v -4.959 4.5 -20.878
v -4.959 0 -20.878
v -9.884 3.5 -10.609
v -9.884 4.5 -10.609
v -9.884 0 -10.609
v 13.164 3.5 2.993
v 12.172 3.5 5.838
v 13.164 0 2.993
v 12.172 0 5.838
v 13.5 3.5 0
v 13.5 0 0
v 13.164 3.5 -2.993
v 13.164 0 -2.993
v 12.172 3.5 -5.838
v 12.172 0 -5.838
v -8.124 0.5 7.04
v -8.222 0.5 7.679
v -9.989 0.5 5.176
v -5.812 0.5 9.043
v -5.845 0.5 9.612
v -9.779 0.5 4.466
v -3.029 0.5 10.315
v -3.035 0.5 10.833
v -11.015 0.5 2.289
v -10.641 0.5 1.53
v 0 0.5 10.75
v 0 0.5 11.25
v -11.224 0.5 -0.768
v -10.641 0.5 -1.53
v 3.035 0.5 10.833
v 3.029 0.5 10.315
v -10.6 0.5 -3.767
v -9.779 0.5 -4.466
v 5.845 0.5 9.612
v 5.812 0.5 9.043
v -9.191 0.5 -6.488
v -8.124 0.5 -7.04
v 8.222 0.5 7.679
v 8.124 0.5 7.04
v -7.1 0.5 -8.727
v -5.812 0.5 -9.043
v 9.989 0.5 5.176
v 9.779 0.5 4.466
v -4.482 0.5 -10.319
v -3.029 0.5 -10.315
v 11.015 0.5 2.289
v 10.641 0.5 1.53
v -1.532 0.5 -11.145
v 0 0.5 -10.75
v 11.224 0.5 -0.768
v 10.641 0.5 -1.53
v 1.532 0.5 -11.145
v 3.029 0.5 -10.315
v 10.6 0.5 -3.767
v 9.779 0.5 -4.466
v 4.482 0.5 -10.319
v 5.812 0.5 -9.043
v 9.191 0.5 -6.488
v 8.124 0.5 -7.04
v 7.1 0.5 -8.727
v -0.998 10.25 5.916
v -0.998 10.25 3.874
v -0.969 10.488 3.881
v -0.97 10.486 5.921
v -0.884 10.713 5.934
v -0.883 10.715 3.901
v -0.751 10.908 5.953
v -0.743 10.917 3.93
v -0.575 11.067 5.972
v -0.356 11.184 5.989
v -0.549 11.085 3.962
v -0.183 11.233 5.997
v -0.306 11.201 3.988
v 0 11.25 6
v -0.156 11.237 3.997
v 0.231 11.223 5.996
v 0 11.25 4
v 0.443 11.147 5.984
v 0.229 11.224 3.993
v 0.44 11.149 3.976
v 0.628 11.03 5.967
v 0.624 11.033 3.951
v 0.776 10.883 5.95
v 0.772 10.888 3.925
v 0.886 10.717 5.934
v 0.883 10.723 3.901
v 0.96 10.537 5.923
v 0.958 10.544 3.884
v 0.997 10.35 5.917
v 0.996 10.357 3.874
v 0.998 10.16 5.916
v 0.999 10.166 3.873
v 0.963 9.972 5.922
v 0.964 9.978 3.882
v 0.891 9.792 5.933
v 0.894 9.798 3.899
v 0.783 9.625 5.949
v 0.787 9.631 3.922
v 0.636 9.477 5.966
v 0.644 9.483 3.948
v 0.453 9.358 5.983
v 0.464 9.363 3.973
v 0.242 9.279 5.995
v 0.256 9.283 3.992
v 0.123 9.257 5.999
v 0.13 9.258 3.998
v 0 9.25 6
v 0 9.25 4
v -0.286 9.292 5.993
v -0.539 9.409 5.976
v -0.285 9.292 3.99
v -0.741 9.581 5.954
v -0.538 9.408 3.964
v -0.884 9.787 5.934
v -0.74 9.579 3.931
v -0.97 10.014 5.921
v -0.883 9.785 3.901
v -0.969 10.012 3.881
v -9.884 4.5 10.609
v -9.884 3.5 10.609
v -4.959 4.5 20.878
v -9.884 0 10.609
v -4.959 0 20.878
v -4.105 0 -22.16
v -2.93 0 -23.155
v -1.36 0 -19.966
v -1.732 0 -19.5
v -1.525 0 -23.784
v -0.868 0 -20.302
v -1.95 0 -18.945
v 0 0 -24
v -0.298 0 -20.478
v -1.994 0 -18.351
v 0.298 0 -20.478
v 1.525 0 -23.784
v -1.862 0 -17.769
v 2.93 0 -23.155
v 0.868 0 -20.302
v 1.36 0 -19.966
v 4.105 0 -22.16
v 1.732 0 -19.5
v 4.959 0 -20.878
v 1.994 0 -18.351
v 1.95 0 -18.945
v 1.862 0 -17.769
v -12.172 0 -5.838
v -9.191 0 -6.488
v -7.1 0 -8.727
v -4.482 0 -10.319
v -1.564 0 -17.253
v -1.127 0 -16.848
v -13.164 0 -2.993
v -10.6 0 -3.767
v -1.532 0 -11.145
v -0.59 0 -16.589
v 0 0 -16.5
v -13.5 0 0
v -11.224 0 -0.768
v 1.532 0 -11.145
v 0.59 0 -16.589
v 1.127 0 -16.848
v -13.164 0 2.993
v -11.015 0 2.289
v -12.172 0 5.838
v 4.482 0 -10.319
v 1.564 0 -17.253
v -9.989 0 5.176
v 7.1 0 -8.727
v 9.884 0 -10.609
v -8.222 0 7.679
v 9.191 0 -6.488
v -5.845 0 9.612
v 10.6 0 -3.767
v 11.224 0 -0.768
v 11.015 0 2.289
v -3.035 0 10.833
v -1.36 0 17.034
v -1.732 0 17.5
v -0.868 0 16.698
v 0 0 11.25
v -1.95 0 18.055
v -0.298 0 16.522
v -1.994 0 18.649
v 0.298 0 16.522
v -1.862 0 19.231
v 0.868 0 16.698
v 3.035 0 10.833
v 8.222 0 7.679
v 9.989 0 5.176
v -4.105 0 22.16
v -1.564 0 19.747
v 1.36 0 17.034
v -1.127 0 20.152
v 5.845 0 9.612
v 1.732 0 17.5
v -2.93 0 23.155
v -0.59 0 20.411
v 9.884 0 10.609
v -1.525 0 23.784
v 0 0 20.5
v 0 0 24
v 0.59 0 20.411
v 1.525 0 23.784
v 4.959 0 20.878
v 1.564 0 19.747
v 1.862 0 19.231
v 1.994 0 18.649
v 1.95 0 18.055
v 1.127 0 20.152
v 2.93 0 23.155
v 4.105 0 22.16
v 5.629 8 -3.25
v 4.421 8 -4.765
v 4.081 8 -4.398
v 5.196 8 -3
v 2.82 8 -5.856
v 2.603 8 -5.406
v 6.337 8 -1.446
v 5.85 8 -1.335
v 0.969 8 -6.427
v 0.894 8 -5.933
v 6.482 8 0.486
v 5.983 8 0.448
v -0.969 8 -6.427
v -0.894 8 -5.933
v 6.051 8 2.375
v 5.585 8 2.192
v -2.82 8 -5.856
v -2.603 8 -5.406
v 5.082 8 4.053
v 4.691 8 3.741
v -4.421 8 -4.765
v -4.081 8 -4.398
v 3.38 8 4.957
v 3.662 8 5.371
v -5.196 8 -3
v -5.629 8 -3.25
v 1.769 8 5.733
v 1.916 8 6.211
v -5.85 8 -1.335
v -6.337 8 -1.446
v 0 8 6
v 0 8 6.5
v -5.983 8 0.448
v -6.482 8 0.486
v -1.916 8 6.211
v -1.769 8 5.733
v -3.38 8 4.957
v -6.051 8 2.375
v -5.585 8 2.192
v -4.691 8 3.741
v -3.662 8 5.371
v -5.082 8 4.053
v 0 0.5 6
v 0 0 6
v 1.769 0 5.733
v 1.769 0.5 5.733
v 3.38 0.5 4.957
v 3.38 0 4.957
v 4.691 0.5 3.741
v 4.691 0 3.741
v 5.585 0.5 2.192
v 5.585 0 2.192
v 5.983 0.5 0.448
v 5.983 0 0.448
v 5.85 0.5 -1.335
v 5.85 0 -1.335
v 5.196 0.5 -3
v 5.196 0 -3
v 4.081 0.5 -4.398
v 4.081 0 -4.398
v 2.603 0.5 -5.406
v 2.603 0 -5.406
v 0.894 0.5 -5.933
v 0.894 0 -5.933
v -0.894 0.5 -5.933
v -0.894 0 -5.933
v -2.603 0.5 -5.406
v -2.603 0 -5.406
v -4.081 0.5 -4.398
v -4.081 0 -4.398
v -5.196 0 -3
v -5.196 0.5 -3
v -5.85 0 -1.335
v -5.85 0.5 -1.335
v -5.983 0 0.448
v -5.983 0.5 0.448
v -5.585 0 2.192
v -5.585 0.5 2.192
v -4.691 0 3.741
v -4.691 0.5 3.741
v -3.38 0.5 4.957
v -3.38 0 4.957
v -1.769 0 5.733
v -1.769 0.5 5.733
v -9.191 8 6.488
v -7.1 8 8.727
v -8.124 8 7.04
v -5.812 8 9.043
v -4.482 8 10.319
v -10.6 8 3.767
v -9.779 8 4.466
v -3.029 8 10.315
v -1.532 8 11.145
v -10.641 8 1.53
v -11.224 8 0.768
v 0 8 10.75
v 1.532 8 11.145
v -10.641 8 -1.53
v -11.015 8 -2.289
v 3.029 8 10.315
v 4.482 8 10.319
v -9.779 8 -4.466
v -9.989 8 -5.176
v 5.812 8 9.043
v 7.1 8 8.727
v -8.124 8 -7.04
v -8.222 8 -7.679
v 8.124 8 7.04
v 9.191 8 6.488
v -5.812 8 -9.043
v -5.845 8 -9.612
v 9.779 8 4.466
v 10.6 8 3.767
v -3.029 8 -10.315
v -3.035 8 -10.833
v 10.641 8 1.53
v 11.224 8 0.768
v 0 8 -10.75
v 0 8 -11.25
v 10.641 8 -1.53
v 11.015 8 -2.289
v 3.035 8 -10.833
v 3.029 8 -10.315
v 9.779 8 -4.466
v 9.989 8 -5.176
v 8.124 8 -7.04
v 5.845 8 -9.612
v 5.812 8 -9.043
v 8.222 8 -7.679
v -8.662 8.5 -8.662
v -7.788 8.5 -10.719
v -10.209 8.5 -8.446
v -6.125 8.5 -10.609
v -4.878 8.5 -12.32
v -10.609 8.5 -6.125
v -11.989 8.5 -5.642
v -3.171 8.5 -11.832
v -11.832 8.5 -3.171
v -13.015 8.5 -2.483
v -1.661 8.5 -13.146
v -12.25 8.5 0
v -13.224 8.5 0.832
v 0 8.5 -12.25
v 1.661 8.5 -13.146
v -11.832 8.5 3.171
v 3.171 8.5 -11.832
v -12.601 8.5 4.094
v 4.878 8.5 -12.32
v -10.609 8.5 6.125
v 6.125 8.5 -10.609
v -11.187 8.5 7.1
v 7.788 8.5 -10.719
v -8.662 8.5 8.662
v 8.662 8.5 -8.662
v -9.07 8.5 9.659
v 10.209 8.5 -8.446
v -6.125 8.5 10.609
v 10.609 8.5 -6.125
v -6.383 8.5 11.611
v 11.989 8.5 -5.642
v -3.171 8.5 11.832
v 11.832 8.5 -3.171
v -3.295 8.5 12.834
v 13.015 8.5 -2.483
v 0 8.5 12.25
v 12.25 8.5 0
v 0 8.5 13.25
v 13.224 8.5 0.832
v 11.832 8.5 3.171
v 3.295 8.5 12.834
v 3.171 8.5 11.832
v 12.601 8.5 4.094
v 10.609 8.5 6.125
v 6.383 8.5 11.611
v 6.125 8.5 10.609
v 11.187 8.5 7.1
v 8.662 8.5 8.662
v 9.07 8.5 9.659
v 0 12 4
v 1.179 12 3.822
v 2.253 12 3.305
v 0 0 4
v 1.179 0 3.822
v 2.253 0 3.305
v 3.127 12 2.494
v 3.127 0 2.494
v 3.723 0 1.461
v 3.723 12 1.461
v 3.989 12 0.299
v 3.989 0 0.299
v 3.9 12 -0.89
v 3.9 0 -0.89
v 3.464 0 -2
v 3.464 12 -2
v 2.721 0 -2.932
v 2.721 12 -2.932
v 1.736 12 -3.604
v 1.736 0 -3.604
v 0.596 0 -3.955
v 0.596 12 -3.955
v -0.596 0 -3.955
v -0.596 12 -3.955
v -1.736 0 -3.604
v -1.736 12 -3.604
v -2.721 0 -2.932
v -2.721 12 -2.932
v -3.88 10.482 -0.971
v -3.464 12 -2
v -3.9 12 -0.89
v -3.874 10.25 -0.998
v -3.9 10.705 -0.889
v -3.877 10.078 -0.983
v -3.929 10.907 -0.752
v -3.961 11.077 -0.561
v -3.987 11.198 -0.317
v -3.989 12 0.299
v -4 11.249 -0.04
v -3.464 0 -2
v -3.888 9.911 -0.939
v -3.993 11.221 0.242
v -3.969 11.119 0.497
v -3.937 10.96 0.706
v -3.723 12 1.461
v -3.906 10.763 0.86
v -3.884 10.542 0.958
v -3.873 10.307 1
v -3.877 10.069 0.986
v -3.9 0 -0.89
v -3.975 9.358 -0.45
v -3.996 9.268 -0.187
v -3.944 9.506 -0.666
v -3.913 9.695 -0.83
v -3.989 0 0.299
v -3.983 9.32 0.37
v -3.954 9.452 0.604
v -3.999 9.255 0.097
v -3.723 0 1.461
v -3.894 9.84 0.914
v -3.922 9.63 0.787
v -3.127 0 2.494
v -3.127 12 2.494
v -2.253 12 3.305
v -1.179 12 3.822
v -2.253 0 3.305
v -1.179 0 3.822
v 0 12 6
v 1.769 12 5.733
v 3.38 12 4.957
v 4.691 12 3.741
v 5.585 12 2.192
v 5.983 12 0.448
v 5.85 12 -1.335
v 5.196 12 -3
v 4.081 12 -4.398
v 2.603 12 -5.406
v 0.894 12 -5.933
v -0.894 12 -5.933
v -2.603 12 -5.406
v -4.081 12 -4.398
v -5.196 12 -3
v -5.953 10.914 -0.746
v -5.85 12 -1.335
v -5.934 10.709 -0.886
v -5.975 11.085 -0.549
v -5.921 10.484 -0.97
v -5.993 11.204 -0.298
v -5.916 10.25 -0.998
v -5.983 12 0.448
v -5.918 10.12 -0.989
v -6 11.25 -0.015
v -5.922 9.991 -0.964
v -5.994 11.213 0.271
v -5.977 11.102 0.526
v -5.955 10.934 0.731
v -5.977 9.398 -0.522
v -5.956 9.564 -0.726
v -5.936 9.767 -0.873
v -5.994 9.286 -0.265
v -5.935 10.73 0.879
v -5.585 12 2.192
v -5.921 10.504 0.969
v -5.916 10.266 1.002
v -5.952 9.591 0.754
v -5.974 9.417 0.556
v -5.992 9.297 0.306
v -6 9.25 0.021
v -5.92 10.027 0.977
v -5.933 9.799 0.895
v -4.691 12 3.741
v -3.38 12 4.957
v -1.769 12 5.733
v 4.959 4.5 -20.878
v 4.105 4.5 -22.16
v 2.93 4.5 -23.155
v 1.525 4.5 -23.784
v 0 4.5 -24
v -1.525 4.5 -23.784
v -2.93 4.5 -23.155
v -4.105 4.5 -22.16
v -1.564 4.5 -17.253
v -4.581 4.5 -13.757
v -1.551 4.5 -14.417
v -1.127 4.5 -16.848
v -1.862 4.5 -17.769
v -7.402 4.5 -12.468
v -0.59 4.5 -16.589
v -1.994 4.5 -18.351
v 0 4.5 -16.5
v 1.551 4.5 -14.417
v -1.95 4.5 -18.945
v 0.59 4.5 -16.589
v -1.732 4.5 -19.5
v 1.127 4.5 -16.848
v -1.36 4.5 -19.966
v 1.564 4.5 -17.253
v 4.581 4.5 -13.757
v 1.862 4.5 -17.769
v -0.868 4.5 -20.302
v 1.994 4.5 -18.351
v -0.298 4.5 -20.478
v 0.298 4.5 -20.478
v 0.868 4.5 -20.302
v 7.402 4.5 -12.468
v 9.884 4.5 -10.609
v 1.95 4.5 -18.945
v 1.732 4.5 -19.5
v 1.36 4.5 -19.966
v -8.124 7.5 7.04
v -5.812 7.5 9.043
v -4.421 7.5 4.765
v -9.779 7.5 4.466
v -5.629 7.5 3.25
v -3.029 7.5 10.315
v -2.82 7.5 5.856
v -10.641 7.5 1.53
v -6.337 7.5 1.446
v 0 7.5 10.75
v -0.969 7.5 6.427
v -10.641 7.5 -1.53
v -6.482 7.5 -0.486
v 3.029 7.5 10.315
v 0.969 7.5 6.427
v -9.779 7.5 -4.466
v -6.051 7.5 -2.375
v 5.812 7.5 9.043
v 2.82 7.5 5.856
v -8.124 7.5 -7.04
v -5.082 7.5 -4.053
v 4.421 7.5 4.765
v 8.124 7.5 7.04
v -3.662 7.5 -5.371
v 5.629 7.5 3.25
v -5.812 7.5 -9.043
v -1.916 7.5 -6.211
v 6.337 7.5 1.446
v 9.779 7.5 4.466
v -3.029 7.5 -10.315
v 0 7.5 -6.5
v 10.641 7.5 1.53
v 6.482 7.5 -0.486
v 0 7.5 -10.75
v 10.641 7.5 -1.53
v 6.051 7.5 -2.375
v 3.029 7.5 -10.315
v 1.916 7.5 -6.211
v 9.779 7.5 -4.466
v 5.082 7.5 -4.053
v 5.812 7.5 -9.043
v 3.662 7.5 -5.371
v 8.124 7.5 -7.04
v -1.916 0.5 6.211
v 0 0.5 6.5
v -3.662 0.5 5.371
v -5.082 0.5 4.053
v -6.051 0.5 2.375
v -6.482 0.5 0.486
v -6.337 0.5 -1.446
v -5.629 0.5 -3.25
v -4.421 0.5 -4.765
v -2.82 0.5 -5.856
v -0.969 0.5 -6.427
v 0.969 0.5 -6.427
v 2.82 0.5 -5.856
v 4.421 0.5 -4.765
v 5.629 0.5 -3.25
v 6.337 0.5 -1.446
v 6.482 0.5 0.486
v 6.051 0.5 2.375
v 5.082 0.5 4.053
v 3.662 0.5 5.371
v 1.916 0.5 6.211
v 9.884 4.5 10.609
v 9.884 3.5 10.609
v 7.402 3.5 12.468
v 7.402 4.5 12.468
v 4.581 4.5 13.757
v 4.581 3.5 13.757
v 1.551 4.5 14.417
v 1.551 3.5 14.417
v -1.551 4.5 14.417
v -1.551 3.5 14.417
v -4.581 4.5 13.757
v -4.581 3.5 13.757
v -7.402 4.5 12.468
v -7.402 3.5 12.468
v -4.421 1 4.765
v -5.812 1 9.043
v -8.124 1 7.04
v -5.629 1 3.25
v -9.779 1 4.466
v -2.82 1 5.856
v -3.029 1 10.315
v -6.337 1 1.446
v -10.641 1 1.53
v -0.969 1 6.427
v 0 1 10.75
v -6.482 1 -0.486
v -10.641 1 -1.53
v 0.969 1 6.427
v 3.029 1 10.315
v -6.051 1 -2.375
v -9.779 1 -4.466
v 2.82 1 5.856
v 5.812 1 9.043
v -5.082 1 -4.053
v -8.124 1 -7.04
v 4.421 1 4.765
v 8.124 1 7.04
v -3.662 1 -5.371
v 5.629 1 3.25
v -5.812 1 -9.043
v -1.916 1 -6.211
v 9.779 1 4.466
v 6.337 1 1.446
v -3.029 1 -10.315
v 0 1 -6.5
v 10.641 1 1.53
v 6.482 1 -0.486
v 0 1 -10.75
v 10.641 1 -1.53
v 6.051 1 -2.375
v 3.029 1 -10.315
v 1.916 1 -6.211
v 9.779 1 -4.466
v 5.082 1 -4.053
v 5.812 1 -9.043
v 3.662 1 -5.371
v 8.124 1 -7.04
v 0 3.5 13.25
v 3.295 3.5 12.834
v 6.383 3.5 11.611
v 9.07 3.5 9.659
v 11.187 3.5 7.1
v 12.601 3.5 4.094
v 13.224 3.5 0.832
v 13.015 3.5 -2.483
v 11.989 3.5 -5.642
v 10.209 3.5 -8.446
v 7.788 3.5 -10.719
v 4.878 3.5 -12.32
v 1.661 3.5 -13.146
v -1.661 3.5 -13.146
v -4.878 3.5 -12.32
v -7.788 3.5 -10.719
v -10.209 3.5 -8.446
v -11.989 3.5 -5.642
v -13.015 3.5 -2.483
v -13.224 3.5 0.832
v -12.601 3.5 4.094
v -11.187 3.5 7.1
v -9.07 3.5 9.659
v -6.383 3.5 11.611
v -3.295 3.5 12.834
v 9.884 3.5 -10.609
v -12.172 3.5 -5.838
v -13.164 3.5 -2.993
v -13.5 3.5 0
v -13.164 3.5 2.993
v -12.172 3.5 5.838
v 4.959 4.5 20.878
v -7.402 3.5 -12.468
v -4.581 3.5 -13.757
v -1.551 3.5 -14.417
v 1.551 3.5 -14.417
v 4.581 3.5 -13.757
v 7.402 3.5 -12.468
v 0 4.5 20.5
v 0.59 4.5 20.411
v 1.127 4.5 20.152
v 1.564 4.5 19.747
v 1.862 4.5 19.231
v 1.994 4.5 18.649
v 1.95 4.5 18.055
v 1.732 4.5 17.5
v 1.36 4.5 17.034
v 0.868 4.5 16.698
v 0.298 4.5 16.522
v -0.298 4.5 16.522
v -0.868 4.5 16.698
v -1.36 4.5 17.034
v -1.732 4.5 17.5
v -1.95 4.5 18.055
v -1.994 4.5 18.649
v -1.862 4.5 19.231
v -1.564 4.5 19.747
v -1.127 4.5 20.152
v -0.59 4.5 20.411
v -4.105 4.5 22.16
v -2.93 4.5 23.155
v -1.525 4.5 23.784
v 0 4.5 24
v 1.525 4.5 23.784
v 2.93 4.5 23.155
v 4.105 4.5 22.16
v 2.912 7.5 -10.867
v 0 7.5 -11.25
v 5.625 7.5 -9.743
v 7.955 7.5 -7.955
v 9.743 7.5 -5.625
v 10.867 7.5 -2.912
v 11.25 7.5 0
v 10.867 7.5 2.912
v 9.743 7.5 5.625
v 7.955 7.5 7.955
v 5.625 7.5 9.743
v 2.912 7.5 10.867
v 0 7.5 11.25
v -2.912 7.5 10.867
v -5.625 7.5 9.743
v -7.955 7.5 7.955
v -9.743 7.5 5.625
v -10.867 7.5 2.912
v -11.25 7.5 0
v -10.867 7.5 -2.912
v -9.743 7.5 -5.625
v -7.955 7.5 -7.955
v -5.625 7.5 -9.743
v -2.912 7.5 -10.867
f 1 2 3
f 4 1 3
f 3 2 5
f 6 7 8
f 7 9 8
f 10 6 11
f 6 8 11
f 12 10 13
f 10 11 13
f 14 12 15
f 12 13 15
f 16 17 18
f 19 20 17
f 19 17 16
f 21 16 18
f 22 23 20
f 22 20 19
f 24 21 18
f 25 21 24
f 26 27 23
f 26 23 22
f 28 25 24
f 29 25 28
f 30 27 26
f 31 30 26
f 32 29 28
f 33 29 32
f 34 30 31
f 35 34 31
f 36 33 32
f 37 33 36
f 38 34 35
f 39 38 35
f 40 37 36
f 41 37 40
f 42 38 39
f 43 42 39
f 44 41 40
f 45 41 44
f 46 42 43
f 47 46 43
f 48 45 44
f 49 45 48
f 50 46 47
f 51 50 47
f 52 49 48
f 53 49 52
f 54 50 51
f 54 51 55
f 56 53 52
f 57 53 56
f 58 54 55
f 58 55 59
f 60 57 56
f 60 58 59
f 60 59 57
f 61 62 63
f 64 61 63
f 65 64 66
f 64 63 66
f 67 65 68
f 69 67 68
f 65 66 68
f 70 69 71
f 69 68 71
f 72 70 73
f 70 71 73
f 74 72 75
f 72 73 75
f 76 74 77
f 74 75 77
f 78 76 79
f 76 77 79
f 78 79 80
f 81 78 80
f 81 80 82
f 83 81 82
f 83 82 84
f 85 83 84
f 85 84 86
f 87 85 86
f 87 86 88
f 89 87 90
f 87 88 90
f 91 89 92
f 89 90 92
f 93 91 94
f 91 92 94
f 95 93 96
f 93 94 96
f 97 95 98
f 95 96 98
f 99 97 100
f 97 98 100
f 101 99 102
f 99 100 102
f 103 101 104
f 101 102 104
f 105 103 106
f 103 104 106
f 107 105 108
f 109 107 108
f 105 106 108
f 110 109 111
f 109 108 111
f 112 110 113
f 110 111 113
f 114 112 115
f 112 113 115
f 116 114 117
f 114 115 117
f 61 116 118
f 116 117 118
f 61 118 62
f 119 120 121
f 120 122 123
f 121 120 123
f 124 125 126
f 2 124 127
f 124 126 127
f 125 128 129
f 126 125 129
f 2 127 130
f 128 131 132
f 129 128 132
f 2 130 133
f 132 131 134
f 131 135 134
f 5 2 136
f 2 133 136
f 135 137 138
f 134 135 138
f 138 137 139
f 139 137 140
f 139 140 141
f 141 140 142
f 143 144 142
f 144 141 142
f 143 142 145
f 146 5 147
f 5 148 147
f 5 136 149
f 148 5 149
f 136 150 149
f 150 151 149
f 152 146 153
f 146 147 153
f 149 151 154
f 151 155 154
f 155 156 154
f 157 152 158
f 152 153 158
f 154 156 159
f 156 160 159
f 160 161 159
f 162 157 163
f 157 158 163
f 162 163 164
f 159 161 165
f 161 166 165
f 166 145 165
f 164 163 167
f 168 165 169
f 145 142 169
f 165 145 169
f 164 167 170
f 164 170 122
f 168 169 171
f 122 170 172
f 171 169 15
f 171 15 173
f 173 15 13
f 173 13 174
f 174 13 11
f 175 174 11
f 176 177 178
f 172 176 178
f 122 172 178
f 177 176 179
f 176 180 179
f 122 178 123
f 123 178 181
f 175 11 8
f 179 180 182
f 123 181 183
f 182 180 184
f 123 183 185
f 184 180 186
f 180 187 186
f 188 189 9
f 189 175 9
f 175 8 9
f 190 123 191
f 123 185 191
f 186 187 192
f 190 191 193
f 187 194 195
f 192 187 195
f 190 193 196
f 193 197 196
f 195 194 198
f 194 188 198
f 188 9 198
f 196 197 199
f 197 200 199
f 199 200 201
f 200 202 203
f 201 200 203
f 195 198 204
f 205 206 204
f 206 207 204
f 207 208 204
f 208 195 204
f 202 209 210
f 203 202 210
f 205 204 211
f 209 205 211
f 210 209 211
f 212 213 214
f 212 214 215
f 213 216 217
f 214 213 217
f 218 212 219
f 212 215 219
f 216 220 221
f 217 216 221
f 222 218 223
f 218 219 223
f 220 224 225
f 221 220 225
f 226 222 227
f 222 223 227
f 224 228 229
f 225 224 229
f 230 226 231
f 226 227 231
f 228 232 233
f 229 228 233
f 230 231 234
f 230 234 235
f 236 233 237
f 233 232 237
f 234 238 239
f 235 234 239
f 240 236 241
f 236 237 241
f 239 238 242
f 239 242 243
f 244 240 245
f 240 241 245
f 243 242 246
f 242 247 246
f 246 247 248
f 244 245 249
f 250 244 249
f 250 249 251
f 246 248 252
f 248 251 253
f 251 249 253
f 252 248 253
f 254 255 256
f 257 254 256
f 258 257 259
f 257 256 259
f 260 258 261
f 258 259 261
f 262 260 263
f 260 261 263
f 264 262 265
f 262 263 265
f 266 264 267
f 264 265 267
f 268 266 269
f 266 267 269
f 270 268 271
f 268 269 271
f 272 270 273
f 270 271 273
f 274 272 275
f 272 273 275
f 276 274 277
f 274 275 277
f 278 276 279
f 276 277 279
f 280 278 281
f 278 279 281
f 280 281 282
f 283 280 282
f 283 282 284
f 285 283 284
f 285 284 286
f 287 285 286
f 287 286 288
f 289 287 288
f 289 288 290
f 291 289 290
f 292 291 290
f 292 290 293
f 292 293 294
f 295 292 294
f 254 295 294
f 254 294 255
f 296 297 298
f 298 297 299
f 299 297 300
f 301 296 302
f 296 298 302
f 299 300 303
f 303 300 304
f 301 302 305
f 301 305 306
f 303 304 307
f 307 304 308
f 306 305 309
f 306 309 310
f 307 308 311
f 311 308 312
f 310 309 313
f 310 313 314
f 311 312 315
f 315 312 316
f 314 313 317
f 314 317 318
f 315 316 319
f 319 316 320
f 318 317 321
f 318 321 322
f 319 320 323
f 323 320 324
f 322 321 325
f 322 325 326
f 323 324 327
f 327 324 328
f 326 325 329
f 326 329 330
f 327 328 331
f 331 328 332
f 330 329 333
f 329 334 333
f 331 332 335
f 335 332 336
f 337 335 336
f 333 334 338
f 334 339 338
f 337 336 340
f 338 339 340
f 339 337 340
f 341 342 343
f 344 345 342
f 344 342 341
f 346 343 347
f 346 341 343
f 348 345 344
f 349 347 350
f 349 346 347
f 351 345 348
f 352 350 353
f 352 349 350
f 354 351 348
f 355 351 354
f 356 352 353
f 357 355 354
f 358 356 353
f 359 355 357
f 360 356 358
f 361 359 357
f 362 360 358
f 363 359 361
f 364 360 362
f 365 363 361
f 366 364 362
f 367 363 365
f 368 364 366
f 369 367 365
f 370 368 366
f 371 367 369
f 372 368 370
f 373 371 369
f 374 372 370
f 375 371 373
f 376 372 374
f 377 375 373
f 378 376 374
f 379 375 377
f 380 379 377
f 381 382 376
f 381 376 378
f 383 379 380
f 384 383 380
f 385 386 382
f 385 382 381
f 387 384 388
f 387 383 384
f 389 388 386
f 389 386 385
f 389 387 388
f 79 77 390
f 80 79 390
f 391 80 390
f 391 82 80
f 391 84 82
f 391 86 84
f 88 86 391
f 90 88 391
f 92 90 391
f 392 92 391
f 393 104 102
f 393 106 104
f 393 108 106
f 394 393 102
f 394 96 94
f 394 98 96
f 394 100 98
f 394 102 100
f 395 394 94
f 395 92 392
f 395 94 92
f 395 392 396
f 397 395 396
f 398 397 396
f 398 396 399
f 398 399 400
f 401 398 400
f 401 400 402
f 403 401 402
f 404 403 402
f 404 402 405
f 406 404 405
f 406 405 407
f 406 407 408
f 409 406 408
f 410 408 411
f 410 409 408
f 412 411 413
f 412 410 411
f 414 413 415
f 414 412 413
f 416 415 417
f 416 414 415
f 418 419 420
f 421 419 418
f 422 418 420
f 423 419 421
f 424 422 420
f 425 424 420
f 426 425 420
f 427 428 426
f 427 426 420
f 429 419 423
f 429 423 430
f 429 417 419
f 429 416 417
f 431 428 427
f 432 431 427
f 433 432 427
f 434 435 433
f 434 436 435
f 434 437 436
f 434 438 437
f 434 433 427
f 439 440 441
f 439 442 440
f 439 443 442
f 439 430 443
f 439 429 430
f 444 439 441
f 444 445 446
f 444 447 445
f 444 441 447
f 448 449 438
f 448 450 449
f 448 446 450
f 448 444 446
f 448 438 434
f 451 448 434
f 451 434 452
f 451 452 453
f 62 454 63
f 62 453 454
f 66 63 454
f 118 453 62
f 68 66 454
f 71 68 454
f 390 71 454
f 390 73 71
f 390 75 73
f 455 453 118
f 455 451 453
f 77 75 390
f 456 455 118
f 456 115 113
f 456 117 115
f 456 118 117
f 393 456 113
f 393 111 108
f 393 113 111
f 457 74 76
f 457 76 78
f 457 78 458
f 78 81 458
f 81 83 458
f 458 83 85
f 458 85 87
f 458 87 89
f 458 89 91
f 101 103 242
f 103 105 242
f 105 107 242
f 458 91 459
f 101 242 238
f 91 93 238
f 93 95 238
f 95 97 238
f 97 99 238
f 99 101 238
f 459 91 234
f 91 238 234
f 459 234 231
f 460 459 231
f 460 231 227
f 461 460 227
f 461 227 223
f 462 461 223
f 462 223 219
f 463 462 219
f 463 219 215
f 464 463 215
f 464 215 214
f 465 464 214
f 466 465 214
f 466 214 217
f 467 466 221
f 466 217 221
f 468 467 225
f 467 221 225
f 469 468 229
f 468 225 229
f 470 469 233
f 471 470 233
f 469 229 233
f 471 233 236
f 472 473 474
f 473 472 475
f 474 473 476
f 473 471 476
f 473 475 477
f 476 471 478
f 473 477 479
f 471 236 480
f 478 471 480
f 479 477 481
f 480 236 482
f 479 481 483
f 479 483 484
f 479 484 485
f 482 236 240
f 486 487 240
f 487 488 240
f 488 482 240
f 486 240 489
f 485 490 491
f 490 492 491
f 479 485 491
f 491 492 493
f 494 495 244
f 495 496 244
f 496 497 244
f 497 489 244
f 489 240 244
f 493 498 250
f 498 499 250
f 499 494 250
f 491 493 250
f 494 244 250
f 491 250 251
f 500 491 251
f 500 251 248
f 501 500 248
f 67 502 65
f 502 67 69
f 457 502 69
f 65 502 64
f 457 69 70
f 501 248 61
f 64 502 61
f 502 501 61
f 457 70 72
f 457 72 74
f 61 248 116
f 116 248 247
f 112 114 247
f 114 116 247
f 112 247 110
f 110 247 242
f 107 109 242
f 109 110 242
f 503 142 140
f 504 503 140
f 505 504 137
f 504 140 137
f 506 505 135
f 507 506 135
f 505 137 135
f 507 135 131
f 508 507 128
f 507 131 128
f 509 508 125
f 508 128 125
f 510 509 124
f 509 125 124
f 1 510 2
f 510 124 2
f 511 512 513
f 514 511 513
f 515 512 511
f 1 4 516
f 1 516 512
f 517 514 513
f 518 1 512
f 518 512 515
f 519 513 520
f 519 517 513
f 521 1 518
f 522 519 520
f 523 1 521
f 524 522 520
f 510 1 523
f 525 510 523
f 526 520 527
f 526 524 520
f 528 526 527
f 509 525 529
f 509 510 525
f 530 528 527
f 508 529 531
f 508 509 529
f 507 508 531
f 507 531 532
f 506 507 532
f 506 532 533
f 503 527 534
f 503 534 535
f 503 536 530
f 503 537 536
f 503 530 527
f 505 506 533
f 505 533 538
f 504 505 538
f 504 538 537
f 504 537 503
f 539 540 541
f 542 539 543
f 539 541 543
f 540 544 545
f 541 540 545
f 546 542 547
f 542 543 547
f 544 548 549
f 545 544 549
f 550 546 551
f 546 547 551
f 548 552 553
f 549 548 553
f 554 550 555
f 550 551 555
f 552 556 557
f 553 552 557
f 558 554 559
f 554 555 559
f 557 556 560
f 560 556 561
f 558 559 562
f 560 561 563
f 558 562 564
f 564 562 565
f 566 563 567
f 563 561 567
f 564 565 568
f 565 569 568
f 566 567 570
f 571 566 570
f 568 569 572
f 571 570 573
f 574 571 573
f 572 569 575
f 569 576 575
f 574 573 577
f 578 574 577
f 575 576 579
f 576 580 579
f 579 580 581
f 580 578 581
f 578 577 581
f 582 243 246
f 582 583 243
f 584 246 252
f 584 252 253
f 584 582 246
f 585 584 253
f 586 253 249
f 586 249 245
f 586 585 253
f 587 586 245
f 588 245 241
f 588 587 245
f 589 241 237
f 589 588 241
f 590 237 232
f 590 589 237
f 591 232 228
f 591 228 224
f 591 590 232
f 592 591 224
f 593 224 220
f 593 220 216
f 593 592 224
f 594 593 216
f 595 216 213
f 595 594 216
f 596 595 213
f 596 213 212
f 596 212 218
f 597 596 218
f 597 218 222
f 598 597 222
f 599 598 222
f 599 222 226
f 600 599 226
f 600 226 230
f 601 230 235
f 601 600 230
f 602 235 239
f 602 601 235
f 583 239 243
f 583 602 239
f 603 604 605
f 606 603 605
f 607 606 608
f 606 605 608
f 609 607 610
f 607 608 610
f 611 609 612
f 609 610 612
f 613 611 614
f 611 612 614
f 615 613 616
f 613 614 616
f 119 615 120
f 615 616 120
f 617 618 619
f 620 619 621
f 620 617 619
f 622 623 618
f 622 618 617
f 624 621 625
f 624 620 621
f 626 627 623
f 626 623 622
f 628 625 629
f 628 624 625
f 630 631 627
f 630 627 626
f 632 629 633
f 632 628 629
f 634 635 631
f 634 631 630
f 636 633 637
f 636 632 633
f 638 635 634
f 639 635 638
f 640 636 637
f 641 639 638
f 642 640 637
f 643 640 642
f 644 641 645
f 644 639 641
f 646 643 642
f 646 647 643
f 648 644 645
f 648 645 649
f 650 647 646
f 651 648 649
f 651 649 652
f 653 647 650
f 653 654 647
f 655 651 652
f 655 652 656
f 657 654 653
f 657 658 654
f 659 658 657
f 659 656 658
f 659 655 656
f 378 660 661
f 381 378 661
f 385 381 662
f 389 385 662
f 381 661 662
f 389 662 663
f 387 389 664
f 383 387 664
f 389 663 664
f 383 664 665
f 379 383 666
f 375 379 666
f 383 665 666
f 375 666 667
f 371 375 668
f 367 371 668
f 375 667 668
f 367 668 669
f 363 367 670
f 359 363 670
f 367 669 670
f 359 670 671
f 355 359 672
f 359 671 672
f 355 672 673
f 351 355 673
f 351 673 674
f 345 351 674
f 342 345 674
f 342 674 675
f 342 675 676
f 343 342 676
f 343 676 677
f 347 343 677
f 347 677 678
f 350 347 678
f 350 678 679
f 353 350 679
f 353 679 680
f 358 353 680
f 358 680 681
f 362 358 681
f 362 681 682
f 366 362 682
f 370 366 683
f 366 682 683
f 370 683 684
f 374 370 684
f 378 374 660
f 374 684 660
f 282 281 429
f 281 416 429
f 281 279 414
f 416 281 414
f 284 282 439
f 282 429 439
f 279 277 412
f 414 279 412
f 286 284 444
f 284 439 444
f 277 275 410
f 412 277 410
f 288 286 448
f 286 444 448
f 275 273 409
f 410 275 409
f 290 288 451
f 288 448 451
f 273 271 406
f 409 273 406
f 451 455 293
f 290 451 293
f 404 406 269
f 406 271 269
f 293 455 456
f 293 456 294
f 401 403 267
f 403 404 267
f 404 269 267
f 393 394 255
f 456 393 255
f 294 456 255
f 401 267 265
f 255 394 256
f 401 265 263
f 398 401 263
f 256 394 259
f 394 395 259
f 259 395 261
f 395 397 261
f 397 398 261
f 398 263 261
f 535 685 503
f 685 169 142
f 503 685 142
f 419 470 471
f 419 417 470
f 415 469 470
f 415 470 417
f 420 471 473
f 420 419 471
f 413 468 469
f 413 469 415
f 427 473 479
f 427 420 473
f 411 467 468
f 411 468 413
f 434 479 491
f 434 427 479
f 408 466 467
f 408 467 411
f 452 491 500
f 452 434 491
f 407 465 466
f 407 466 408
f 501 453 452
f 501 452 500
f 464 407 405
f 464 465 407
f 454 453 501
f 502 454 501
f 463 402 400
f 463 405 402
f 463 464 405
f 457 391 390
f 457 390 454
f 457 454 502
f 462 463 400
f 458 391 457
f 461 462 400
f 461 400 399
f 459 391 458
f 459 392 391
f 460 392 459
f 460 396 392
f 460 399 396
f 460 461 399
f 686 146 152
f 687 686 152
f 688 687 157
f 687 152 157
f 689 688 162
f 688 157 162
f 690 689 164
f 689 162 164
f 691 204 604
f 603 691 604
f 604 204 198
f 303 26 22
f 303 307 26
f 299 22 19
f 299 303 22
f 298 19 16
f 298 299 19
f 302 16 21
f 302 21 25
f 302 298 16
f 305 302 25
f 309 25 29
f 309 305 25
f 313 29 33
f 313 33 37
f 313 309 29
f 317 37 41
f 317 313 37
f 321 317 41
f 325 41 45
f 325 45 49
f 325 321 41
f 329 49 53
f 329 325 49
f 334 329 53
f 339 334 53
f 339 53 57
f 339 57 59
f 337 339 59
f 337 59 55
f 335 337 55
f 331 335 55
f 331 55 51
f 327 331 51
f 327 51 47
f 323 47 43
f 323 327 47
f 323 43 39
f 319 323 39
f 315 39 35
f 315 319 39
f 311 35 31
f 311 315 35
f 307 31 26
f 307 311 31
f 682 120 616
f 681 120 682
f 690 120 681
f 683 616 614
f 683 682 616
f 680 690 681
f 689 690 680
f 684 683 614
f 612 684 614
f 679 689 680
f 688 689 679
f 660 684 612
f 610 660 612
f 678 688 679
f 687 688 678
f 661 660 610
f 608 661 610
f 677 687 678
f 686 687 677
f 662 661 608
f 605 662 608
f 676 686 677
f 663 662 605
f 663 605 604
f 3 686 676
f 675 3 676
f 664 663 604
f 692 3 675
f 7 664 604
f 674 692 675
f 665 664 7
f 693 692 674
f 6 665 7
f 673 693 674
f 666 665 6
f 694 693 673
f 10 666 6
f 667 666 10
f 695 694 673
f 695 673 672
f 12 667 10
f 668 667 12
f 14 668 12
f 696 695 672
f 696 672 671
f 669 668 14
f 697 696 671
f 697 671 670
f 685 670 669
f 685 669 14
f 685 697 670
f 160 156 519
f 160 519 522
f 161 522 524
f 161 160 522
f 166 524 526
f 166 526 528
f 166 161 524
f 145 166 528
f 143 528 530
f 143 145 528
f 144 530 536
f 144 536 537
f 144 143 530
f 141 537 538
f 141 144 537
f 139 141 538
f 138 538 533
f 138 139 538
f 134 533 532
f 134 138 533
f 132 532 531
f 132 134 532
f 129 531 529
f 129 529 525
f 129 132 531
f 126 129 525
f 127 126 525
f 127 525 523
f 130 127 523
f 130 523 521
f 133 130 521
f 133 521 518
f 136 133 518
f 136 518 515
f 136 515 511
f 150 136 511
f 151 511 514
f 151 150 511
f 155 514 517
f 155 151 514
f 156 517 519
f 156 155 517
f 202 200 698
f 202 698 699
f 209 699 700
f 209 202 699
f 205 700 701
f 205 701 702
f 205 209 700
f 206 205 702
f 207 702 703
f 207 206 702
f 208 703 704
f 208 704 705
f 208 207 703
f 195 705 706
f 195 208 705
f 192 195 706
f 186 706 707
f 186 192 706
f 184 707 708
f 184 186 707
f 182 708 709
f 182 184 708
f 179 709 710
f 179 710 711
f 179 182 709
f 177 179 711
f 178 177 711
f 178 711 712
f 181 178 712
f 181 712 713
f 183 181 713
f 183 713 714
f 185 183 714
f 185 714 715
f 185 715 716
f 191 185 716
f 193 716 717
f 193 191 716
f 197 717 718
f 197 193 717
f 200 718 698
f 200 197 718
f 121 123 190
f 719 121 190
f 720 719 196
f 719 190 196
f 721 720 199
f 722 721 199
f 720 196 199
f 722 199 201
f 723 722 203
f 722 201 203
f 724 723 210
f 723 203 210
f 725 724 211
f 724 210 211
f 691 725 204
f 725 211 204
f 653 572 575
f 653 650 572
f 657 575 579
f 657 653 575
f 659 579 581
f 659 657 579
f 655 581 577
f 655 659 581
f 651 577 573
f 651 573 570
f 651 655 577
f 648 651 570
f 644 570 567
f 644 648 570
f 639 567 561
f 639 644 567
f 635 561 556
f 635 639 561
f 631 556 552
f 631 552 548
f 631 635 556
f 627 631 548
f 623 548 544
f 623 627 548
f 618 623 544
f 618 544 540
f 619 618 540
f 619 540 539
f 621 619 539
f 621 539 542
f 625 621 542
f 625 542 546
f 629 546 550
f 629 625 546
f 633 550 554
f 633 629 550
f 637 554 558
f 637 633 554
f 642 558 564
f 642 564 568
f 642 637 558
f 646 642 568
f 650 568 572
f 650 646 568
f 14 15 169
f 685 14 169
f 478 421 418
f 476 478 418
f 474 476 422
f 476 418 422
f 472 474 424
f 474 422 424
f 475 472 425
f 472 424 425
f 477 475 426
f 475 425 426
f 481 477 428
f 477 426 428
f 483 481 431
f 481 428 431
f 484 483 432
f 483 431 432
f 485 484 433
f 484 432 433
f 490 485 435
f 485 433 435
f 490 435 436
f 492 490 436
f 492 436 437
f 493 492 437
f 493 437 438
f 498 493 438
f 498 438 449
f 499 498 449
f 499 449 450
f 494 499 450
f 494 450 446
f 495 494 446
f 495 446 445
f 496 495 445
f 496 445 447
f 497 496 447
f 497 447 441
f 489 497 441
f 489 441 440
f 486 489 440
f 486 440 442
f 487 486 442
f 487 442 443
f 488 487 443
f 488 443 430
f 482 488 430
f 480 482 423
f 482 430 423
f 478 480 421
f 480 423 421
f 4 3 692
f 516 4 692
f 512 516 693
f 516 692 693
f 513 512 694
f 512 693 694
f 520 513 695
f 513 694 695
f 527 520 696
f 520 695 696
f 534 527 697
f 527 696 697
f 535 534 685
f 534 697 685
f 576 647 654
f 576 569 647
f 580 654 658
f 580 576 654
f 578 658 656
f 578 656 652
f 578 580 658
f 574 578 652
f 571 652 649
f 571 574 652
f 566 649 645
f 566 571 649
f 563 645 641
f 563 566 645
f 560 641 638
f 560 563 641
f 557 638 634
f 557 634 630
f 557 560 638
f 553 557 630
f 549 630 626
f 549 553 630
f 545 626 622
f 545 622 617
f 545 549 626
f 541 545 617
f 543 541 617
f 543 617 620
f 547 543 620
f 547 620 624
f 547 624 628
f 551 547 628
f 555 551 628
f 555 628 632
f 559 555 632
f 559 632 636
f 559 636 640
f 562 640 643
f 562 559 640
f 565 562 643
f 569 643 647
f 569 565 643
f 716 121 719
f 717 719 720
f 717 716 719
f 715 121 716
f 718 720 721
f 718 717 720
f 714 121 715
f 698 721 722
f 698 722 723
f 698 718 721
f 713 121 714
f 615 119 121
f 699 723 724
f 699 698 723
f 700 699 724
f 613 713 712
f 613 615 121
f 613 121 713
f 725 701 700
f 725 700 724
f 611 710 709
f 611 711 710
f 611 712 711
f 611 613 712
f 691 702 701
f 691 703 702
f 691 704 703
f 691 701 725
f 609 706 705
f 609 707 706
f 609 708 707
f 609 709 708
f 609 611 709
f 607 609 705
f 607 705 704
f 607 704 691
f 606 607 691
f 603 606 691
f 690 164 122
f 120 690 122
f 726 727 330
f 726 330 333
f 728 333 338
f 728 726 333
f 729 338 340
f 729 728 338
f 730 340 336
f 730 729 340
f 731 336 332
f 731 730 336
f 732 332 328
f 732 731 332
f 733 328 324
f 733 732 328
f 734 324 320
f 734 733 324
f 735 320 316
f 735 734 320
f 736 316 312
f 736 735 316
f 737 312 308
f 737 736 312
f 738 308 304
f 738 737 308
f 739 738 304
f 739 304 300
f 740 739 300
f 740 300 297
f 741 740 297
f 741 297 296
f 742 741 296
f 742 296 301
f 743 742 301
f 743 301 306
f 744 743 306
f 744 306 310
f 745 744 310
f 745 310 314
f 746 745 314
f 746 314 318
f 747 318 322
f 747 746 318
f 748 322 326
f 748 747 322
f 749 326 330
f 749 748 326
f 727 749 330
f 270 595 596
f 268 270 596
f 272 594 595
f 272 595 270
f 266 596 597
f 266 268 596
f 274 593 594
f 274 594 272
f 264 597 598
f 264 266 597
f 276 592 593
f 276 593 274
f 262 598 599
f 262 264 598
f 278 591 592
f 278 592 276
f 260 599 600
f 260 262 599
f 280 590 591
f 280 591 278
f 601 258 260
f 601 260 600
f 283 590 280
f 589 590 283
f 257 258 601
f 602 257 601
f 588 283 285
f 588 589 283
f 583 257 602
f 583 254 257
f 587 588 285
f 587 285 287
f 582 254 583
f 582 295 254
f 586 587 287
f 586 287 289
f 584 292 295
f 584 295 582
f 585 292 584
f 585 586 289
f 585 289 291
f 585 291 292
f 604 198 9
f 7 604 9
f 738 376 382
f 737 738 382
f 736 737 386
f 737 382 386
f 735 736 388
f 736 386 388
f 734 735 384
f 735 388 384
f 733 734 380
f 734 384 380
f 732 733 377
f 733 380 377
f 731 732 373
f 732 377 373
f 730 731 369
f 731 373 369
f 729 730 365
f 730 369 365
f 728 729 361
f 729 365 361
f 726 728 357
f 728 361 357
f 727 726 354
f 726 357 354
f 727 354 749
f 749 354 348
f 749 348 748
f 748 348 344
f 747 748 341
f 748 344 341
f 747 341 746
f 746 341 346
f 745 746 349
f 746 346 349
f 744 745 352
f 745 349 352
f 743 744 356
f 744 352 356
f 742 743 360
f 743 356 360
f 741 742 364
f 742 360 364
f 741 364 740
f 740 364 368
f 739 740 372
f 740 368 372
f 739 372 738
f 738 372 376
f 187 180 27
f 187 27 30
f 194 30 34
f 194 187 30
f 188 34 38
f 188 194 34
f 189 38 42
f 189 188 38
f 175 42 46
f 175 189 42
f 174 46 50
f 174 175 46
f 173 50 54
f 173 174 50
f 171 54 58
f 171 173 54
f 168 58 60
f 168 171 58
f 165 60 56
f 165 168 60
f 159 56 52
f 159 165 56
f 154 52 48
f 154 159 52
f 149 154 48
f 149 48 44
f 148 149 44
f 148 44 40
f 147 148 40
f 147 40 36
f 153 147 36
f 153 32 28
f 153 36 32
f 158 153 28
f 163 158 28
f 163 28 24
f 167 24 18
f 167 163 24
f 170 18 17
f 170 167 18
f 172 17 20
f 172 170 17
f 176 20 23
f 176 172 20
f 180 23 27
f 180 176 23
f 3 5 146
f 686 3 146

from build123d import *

# Parameters (mm, degrees)
SKETCH1_R             = 2
BOSS_EXTRUDE1_DEPTH   = 4.5
BOSS_EXTRUDE1_2_DEPTH = 4.5
SKETCH1_3_R           = 13.5
SKETCH1_3_R_2         = 13.25
BOSS_EXTRUDE2_DEPTH   = 3.5
SKETCH1_5_R           = 13.25
SKETCH1_5_R_2         = 12.25
BOSS_EXTRUDE3_DEPTH   = 8.5
SKETCH1_6_R           = 6
SKETCH1_6_R_2         = 4
BOSS_EXTRUDE4_DEPTH   = 12
SKETCH1_7_R           = 12.25
SKETCH1_7_R_2         = 11.25
BOSS_EXTRUDE5_DEPTH   = 8.5
CHAMFER1_SIZE         = 1
SKETCH2_R             = 11.25
SKETCH2_R_2           = 10.75
SKETCH2_R_3           = 6.5
SKETCH2_R_4           = 6
BOSS_EXTRUDE6_DEPTH   = 3.75
SKETCH2_3_R           = 10.75
SKETCH2_3_R_2         = 6.5
BOSS_EXTRUDE7_DEPTH   = 3.25
SKETCH3_R             = 1
CUT_EXTRUDE2_DEPTH    = 7.5
CIRPATTERN1_COUNT     = 2
CIRPATTERN1_ANGLE     = 90


with BuildPart() as part:
    # Sketch1 → Boss-Extrude1 (new body)
    with BuildSketch(Plane(origin=(0, 0, 0), x_dir=(1, 0, 0), z_dir=(0, 1, 0))):
        with BuildLine():
            Line((4.959164878, -20.878378378), (9.88427826, -10.609007648))
            ThreePointArc((9.88427826, -10.609007648), (0, -14.5), (-9.88427826, -10.609007648))
            Line((-9.88427826, -10.609007648), (-4.959164878, -20.878378378))
            ThreePointArc((-4.959164878, -20.878378378), (0, -24), (4.959164878, -20.878378378))
        make_face()
        with Locations(Location((0, -18.5, 0), (0, 0, 270))):
            Circle(SKETCH1_R, mode=Mode.SUBTRACT)
    extrude(amount=BOSS_EXTRUDE1_DEPTH)



with BuildPart() as body_2:
    # Sketch1 → Boss-Extrude1 2 (new body)
    with BuildSketch(Plane(origin=(0, 0, 0), x_dir=(1, 0, 0), z_dir=(0, 1, 0))):
        with BuildLine():
            ThreePointArc((-9.88427826, 10.609007648), (0, 14.5), (9.88427826, 10.609007648))
            Line((9.88427826, 10.609007648), (4.959164878, 20.878378378))
            ThreePointArc((4.959164878, 20.878378378), (0, 24), (-4.959164878, 20.878378378))
            Line((-4.959164878, 20.878378378), (-9.88427826, 10.609007648))
        make_face()
        with Locations(Location((0, 18.5, 0), (0, 0, 270))):
            Circle(SKETCH1_R, mode=Mode.SUBTRACT)
    extrude(amount=BOSS_EXTRUDE1_2_DEPTH)


with BuildPart() as part_1:
    add(part.part)

    add(body_2.part)  # Boss-Extrude2 merges body 2
    # Sketch1<3> → Boss-Extrude2 (add)
    # profile 1 of 3: a face of its own
    with BuildSketch(Plane(origin=(0, 0, 0), x_dir=(1, 0, 0), z_dir=(0, 1, 0))):
        with BuildLine():
            Line((9.88427826, -10.609007648), (12.17249561, -5.837837838))
            ThreePointArc((12.17249561, -5.837837838), (0, -13.5), (-12.17249561, -5.837837838))
            Line((-12.17249561, -5.837837838), (-9.88427826, -10.609007648))
            ThreePointArc((-9.88427826, -10.609007648), (0, -14.5), (9.88427826, -10.609007648))
        make_face()
    # profile 2 of 3: a face of its own
    with BuildSketch(Plane(origin=(0, 0, 0), x_dir=(1, 0, 0), z_dir=(0, 1, 0))):
        with BuildLine():
            ThreePointArc((-12.17249561, 5.837837838), (0, 13.5), (12.17249561, 5.837837838))
            Line((12.17249561, 5.837837838), (9.88427826, 10.609007648))
            ThreePointArc((9.88427826, 10.609007648), (0, 14.5), (-9.88427826, 10.609007648))
            Line((-9.88427826, 10.609007648), (-12.17249561, 5.837837838))
        make_face()
    # profile 3 of 3: a face of its own
    with BuildSketch(Plane(origin=(0, 0, 0), x_dir=(1, 0, 0), z_dir=(0, 1, 0))):
        Circle(SKETCH1_3_R)
        with Locations(Location((0, 0, 0), (0, 0, 270))):
            Circle(SKETCH1_3_R_2, mode=Mode.SUBTRACT)
    extrude(amount=BOSS_EXTRUDE2_DEPTH)

    # Sketch1<5> → Boss-Extrude3 (add)
    with BuildSketch(Plane(origin=(0, 0, 0), x_dir=(1, 0, 0), z_dir=(0, 1, 0))):
        with Locations(Location((0, 0, 0), (0, 0, 270))):
            Circle(SKETCH1_5_R)
        with Locations(Location((0, 0, 0), (0, 0, 270))):
            Circle(SKETCH1_5_R_2, mode=Mode.SUBTRACT)
    extrude(amount=BOSS_EXTRUDE3_DEPTH)



with BuildPart() as body_2_2:
    # Sketch1<6> → Boss-Extrude4 (new body)
    with BuildSketch(Plane(origin=(0, 0, 0), x_dir=(1, 0, 0), z_dir=(0, 1, 0))):
        with Locations(Location((0, 0, 0), (0, 0, 270))):
            Circle(SKETCH1_6_R)
        with Locations(Location((0, 0, 0), (0, 0, 270))):
            Circle(SKETCH1_6_R_2, mode=Mode.SUBTRACT)
    extrude(amount=BOSS_EXTRUDE4_DEPTH)


with BuildPart() as body_3:
    # Sketch1<7> → Boss-Extrude5 (new body)
    with BuildSketch(Plane(origin=(0, 0, 0), x_dir=(1, 0, 0), z_dir=(0, 1, 0))):
        with Locations(Location((0, 0, 0), (0, 0, 270))):
            Circle(SKETCH1_7_R)
        with Locations(Location((0, 0, 0), (0, 0, 270))):
            Circle(SKETCH1_7_R_2, mode=Mode.SUBTRACT)
    extrude(amount=BOSS_EXTRUDE5_DEPTH)

    # Chamfer1
    chamfer1_edges = [body_3.edges().sort_by_distance(p)[0] for p in [
        (0, 8.5, -11.25),
    ]]
    chamfer(chamfer1_edges, length=CHAMFER1_SIZE - 0.0001)  # a hair under: the kernel refuses the full size


with BuildPart() as part_2:
    add(part_1.part)

    add(body_3.part)  # Boss-Extrude6 merges body 3

    add(body_2_2.part)  # Boss-Extrude6 merges body 2 2
    # Sketch2 → Boss-Extrude6 (add, symmetric)
    # profile 1 of 2: a face of its own
    with BuildSketch(Plane(origin=(0, 4.25, 0), x_dir=(-1, 0, 0), z_dir=(0, -1, 0))):
        with Locations(Location((0, 0, 0), (0, 0, 90))):
            Circle(SKETCH2_R)
        with Locations(Location((0, 0, 0), (0, 0, 270))):
            Circle(SKETCH2_R_2, mode=Mode.SUBTRACT)
    # profile 2 of 2: a face of its own
    with BuildSketch(Plane(origin=(0, 4.25, 0), x_dir=(-1, 0, 0), z_dir=(0, -1, 0))):
        with Locations(Location((0, 0, 0), (0, 0, 270))):
            Circle(SKETCH2_R_3)
        with Locations(Location((0, 0, 0), (0, 0, 90))):
            Circle(SKETCH2_R_4, mode=Mode.SUBTRACT)
    extrude(amount=BOSS_EXTRUDE6_DEPTH, both=True)

    # Sketch3 → Cut-Extrude2 (cut)
    with BuildSketch(Plane(origin=(0, 0, 0), x_dir=(0, 0, -1), z_dir=(1, 0, 0))):
        with Locations((-0.002027508, 10.25)):
            Circle(SKETCH3_R)
    cut_extrude2 = extrude(amount=-CUT_EXTRUDE2_DEPTH, mode=Mode.SUBTRACT)

    # CirPattern1: Cut-Extrude2 ×2 about axis
    cirpattern1_axis = Axis((0, 12, 0), (0, 1, 0))
    for i in range(1, CIRPATTERN1_COUNT):
        add(cut_extrude2.rotate(cirpattern1_axis, i * CIRPATTERN1_ANGLE / (CIRPATTERN1_COUNT - 1)), mode=Mode.SUBTRACT)


with BuildPart() as body_2_3:
    # Sketch2<3> → Boss-Extrude7 (new, symmetric)
    with BuildSketch(Plane(origin=(0, 4.25, 0), x_dir=(-1, 0, 0), z_dir=(0, -1, 0))):
        with Locations(Location((0, 0, 0), (0, 0, 90))):
            Circle(SKETCH2_3_R)
        with Locations(Location((0, 0, 0), (0, 0, 90))):
            Circle(SKETCH2_3_R_2, mode=Mode.SUBTRACT)
    extrude(amount=BOSS_EXTRUDE7_DEPTH, both=True)


solid = Compound([part_2.part, body_2_3.part])
